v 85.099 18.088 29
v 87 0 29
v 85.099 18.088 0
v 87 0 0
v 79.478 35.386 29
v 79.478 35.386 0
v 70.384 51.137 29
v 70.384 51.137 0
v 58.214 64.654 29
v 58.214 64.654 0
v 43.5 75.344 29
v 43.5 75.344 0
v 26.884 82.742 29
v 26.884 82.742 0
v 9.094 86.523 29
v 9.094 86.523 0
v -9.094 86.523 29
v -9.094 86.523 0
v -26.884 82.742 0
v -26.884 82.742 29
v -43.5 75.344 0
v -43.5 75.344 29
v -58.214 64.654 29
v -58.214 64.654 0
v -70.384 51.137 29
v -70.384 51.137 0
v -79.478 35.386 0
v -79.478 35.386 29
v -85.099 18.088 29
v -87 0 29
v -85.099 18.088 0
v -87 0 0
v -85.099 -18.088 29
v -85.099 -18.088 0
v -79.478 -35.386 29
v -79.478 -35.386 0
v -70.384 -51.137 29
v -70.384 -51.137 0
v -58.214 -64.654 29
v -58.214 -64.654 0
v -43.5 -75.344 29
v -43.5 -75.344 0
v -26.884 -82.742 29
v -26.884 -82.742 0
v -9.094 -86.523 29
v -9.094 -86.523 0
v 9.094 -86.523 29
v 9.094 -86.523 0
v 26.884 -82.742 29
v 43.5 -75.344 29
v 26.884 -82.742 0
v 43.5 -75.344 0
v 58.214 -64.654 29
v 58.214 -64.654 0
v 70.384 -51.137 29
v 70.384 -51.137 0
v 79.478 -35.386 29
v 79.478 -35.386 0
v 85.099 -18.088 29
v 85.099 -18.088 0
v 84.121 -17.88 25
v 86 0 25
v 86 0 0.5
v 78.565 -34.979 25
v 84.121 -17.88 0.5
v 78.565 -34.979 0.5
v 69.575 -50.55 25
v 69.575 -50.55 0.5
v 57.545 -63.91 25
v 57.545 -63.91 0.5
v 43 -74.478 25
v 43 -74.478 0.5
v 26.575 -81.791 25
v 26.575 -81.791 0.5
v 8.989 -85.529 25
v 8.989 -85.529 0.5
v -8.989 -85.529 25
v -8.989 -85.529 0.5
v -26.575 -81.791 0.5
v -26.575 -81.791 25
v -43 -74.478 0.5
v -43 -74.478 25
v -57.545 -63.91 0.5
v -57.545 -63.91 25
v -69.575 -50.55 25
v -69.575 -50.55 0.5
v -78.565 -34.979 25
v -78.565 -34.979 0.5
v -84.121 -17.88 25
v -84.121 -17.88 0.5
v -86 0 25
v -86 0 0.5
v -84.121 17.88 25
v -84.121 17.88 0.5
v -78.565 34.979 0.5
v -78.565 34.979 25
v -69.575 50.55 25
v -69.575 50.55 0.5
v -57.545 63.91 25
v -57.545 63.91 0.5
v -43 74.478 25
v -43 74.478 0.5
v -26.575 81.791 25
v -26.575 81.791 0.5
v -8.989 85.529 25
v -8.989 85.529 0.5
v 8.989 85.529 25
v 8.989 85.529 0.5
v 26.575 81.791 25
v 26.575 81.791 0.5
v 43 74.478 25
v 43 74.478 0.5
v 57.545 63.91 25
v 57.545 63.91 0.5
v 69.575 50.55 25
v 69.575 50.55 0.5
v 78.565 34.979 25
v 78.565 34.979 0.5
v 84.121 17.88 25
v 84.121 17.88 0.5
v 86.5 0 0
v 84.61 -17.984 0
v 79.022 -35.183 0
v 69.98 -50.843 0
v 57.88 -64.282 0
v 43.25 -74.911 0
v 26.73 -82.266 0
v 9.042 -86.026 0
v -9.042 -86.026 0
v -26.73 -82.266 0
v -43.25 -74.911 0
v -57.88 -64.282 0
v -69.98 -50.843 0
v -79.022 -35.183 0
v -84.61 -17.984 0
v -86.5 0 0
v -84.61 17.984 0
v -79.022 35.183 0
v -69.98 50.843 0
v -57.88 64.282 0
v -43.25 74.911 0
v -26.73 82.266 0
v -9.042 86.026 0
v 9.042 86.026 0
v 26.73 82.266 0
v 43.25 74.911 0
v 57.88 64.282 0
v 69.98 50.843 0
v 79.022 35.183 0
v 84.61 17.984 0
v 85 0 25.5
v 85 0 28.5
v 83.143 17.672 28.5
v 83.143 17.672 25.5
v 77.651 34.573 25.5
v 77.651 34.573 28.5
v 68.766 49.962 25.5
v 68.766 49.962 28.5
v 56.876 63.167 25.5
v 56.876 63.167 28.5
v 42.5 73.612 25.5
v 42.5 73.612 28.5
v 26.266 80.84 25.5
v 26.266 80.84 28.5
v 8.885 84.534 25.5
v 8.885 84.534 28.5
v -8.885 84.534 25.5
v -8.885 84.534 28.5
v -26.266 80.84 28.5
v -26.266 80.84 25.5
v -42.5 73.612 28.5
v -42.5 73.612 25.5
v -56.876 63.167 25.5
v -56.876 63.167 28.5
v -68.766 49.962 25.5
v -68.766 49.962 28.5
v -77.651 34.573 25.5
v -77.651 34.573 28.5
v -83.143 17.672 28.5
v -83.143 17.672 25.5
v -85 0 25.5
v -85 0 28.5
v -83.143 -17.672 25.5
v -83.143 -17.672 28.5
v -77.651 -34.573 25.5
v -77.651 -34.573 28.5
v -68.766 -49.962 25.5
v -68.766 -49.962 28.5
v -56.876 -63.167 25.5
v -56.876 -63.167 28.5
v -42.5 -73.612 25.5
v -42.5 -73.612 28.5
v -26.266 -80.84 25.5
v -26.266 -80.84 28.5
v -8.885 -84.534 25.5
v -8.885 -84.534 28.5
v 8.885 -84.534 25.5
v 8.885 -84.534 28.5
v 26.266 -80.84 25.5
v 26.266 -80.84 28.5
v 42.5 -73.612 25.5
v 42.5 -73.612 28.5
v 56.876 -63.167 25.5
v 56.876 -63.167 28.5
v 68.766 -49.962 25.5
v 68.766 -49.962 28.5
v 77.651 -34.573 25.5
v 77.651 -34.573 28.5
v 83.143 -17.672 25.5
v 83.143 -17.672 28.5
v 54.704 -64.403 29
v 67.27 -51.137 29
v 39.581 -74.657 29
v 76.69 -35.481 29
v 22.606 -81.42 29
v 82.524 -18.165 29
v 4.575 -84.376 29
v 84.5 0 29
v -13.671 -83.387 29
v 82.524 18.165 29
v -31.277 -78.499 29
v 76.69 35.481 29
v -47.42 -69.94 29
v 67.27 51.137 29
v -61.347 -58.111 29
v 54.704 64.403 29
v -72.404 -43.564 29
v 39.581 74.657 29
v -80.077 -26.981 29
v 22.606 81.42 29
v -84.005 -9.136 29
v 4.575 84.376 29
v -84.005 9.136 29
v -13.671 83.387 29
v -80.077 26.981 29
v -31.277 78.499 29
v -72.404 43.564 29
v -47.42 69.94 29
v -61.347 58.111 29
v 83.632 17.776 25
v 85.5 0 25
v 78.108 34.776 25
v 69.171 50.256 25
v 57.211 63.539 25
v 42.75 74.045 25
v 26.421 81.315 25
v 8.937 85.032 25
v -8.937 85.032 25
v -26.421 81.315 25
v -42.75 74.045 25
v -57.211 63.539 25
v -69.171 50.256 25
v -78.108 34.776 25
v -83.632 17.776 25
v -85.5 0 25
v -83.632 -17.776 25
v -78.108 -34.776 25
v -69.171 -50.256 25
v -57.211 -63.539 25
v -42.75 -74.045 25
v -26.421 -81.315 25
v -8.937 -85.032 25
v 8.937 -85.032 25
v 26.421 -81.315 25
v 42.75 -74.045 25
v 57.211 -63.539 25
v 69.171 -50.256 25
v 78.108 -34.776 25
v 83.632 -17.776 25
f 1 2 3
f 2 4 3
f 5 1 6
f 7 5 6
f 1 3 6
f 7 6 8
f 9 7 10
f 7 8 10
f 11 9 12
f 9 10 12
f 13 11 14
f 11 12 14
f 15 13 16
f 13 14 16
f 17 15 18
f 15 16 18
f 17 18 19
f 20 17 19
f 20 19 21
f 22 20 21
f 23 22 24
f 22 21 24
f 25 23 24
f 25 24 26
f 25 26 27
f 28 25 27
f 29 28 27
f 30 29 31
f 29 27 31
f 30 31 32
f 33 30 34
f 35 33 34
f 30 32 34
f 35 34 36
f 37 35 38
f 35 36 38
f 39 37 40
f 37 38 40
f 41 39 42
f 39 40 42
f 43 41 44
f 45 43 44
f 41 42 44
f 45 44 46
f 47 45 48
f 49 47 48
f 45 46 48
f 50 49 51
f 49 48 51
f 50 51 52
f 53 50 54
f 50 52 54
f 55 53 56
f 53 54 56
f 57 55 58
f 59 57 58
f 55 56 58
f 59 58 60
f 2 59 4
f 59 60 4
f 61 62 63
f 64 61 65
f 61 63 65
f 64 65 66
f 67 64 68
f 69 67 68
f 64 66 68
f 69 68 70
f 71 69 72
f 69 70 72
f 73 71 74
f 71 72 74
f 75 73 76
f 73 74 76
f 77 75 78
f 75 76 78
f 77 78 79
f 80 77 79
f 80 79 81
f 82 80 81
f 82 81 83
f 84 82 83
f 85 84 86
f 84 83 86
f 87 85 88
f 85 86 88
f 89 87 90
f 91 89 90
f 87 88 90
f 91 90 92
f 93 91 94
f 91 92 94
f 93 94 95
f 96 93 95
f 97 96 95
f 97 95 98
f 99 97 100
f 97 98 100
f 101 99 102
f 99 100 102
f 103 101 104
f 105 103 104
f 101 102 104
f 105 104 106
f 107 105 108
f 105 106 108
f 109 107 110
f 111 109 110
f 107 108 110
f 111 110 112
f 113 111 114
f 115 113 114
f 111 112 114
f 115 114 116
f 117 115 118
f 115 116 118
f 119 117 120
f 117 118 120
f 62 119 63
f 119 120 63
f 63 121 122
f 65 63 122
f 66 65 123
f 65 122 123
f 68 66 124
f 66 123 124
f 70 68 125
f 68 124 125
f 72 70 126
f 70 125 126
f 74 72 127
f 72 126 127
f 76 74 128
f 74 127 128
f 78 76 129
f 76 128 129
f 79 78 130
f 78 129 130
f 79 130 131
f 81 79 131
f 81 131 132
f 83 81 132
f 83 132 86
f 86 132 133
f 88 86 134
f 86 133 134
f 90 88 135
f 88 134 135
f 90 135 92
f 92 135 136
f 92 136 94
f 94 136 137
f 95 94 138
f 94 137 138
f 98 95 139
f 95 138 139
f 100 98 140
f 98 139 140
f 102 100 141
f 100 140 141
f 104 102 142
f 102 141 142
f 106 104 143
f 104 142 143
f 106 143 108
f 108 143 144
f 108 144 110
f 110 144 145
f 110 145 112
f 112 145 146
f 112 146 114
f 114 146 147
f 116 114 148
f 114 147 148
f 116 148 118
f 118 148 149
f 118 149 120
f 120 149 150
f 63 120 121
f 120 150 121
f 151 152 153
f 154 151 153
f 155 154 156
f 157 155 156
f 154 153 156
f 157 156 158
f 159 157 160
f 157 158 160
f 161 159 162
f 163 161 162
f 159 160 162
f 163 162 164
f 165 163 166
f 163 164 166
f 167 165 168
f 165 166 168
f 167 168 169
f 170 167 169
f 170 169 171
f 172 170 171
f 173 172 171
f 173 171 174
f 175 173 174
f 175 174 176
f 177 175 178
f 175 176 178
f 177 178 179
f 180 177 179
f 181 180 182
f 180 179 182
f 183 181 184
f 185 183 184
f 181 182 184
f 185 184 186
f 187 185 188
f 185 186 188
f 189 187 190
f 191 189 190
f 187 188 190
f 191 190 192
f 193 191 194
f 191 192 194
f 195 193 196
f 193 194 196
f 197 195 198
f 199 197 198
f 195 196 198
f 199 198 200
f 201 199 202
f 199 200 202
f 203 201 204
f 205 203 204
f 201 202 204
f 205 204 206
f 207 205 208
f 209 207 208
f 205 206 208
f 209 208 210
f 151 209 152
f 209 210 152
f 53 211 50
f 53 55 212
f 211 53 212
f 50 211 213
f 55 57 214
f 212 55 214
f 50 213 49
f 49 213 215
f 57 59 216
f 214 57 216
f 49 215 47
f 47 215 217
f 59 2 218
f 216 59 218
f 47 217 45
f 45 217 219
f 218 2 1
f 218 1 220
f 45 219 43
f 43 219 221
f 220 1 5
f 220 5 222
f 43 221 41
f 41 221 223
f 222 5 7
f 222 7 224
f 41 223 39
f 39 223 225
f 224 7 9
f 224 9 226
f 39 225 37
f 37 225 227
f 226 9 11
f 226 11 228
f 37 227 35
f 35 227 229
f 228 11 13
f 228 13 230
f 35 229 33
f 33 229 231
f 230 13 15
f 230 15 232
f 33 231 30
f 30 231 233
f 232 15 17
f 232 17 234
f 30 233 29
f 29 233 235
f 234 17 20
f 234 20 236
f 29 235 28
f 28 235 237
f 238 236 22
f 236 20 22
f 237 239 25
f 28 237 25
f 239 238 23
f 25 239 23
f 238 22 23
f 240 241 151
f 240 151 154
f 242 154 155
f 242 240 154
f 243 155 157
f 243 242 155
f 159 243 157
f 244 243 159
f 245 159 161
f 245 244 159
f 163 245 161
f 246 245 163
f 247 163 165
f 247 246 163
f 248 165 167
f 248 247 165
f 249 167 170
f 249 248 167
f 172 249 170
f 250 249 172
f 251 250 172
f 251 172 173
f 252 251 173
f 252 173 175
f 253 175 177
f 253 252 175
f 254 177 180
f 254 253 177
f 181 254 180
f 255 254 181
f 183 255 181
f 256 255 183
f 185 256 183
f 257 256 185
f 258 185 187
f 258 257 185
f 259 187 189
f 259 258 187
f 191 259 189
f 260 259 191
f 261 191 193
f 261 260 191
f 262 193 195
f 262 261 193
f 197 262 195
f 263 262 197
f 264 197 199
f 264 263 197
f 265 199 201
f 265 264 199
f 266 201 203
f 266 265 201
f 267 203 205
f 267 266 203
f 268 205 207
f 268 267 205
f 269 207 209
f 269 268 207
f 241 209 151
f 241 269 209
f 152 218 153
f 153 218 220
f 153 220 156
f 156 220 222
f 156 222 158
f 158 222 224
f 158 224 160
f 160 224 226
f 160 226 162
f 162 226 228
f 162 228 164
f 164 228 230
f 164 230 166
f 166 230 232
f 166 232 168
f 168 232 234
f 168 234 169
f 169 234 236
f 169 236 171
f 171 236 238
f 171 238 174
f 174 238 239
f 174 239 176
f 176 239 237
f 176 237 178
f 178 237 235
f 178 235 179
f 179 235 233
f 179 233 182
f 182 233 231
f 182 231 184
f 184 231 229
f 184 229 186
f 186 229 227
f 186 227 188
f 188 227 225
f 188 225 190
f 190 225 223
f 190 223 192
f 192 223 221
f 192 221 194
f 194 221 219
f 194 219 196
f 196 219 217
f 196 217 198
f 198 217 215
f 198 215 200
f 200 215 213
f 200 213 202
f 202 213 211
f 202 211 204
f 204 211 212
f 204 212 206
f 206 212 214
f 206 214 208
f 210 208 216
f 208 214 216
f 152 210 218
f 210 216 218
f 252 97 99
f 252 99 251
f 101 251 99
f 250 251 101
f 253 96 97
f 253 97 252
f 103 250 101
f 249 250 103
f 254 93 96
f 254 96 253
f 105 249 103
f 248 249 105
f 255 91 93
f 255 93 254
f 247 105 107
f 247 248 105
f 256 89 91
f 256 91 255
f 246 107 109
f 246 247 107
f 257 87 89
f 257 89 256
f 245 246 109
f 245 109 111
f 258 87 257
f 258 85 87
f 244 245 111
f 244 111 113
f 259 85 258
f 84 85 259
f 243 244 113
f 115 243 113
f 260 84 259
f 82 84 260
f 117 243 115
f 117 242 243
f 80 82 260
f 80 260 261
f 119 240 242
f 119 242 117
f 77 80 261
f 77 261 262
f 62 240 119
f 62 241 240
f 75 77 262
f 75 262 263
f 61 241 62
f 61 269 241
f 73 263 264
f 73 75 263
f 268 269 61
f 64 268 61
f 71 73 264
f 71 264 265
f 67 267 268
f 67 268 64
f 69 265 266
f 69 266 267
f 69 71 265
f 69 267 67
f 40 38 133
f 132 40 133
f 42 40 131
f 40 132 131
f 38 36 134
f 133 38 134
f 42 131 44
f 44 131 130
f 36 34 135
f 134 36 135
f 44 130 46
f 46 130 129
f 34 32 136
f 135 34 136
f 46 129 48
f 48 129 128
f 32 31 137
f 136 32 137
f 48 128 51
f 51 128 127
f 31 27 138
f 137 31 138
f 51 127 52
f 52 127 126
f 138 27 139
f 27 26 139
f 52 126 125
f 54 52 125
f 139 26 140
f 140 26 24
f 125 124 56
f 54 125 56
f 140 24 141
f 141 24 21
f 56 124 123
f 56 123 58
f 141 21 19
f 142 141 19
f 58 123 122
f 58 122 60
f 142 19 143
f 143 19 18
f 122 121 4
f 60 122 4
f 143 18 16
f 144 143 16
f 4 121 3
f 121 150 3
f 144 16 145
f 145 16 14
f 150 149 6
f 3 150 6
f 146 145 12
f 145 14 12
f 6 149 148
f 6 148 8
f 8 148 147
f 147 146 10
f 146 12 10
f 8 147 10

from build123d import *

# Parameters (mm, degrees)
SKETCH020_R     = 86
POCKET013_DEPTH = 25
CHAMFER003_SIZE = 0.5


with BuildPart() as part:
    # Sketch019 → Revolution (revolve)
    with BuildSketch(Plane.XZ):
        Polygon((85, 0), (85, 28.5), (84.5, 29), (87, 29), (87, 0), align=None)
    revolve(axis=Axis((0, 0, 0), (0, 0, 1)))

    # Sketch020 (on Face5 of Revolution) → Pocket013 (cut)
    with BuildSketch(Plane(origin=(0, 0, 0), x_dir=(1, 0, 0), z_dir=(0, 0, -1))):
        Circle(SKETCH020_R)
    extrude(amount=-POCKET013_DEPTH, mode=Mode.SUBTRACT)

    # Chamfer003
    chamfer003_edges = [part.edges().sort_by_distance(p)[0] for p in [
        (-85, 0, 25),
        (-86, 0, 0),
    ]]
    chamfer(chamfer003_edges, length=CHAMFER003_SIZE)


solid = part.part
